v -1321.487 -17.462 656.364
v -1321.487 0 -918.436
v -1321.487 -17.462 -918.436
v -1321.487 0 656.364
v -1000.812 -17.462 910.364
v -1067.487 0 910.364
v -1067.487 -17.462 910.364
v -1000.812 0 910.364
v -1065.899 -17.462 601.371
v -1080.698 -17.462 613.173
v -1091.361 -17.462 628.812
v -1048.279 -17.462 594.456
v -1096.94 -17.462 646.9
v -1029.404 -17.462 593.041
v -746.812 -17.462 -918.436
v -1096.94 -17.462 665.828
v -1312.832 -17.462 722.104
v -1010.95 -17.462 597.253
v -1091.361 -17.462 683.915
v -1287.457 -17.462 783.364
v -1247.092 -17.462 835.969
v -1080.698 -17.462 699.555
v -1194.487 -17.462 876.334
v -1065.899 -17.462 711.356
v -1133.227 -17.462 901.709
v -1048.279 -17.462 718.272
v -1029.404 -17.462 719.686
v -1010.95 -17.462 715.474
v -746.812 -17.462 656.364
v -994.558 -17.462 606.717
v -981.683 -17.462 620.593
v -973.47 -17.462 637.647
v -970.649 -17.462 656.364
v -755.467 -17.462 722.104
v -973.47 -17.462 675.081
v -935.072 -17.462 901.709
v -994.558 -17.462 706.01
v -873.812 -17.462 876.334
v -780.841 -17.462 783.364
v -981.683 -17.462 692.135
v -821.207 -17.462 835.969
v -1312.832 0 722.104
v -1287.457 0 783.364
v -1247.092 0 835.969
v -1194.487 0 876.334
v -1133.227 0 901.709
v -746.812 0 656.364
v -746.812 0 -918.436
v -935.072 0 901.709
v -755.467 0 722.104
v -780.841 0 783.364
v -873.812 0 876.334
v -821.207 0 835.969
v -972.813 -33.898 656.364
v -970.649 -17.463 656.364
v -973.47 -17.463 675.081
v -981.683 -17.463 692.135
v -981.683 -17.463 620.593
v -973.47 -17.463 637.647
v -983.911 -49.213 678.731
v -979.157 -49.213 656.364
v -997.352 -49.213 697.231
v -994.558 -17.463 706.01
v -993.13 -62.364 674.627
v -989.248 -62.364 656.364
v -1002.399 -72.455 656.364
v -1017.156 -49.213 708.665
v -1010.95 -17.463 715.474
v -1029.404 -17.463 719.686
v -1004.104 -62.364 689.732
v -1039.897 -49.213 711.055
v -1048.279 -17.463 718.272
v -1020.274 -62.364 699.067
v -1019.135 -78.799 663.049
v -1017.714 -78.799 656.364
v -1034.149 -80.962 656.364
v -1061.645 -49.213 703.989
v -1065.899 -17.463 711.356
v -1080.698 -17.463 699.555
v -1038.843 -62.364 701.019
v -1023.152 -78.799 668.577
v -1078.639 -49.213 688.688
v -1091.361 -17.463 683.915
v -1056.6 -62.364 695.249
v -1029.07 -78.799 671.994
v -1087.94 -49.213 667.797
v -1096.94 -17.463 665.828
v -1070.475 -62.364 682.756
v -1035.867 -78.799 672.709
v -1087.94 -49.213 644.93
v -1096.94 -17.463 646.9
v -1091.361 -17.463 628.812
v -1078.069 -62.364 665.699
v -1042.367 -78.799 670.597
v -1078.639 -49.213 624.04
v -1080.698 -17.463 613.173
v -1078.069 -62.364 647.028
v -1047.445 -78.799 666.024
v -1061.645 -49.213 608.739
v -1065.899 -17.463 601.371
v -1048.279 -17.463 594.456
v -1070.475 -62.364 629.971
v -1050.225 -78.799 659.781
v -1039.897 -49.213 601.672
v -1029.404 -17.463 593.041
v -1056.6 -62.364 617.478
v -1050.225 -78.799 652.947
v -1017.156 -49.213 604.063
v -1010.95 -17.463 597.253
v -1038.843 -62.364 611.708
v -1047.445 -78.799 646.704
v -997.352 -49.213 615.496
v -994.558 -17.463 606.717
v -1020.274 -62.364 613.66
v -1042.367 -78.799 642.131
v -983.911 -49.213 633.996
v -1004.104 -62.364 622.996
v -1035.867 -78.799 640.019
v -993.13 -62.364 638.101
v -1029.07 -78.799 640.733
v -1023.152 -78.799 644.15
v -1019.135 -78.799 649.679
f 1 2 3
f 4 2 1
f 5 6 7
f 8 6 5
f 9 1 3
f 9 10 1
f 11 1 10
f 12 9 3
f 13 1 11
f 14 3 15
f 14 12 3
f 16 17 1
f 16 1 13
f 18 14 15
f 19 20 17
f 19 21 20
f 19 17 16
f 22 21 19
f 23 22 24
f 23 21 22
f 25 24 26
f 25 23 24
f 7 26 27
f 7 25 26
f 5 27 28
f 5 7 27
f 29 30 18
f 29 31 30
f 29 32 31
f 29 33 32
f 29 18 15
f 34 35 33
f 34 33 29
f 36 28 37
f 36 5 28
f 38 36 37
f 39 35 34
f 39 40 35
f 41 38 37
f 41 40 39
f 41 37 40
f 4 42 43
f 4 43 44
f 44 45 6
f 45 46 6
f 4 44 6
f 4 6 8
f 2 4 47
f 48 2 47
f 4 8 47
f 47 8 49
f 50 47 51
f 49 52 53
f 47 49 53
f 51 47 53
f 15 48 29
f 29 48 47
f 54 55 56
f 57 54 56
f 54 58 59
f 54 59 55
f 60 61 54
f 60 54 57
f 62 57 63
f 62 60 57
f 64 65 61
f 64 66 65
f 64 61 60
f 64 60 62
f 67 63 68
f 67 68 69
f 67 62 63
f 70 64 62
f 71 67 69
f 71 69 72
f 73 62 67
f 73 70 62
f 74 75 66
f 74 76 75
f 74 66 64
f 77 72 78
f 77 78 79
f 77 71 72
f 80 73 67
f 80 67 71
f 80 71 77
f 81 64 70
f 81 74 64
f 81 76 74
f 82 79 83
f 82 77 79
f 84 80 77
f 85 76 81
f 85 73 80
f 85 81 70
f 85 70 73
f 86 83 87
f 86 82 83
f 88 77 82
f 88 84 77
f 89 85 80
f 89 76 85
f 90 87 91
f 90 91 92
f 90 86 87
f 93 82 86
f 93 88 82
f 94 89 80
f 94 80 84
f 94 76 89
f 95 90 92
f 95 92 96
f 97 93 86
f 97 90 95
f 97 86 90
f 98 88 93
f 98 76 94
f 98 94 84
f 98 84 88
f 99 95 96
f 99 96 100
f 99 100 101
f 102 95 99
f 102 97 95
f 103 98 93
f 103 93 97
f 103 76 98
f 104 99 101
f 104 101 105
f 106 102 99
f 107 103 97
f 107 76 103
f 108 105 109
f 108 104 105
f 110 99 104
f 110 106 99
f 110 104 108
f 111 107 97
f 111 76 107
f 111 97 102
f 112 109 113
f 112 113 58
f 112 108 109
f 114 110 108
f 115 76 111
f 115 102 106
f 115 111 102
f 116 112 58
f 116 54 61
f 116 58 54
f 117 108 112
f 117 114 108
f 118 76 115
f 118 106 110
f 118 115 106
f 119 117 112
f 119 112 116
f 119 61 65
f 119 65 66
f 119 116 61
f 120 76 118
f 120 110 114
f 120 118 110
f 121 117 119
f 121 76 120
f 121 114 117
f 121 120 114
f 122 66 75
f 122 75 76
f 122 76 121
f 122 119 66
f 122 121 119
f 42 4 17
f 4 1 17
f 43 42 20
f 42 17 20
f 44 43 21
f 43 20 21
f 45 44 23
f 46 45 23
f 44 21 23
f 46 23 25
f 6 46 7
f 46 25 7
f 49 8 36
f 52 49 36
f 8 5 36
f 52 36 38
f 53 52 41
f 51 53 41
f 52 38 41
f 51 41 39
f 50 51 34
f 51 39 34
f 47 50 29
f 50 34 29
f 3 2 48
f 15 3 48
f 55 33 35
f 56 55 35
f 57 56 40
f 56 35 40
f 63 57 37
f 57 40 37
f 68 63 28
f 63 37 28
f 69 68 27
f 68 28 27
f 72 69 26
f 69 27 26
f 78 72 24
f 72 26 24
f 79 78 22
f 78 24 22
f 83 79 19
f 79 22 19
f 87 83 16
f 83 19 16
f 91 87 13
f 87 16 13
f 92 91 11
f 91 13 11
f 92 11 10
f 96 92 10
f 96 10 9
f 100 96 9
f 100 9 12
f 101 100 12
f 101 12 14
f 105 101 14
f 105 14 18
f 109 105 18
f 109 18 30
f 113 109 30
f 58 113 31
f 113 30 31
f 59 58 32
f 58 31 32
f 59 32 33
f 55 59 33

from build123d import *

# Parameters (mm, degrees)
F0_W     = 574.675
F0_H     = 1828.8
F1_DEPTH = 17.4625
F2_R     = 254
F3_R     = 254
F4_R     = 63.5
F5_DEPTH = 63.5
F6_R     = 63.49999


# Not quite as in the source:
# - a fillet or chamfer is up to 0.001 mm smaller than in the source, because OpenCascade refuses the exact size


with BuildPart() as f1:
    # F0 (on Front) → F1 (new body)
    with BuildSketch(Plane.XZ):
        with Locations((-1034.1491804612, -4.0362142026)):
            Rectangle(F0_W, F0_H)
    extrude(amount=F1_DEPTH)

    # F2
    f2_edges = [f1.edges().sort_by_distance(p)[0] for p in [
        (-1321.48668, -8.73125, 910.363786),
    ]]
    fillet(f2_edges, radius=F2_R)

    # F3
    f3_edges = [f1.edges().sort_by_distance(p)[0] for p in [
        (-746.81168, -8.73125, 910.363786),
    ]]
    fillet(f3_edges, radius=F3_R)

    # F4 (on face) → F5 (join)
    with BuildSketch(Plane.XZ.offset(17.4625)):
        with Locations((-1034.1491804612, 656.3637857974)):
            Circle(F4_R)
    extrude(amount=F5_DEPTH)

    # F6 (radius 63.5 in the source; OpenCascade refuses exactly that, so slightly less here)
    f6_edges = [f1.edges().sort_by_distance(p)[0] for p in [
        (-1097.64918, -80.9625, 656.363786),
    ]]
    fillet(f6_edges, radius=F6_R)


solid = f1.part
